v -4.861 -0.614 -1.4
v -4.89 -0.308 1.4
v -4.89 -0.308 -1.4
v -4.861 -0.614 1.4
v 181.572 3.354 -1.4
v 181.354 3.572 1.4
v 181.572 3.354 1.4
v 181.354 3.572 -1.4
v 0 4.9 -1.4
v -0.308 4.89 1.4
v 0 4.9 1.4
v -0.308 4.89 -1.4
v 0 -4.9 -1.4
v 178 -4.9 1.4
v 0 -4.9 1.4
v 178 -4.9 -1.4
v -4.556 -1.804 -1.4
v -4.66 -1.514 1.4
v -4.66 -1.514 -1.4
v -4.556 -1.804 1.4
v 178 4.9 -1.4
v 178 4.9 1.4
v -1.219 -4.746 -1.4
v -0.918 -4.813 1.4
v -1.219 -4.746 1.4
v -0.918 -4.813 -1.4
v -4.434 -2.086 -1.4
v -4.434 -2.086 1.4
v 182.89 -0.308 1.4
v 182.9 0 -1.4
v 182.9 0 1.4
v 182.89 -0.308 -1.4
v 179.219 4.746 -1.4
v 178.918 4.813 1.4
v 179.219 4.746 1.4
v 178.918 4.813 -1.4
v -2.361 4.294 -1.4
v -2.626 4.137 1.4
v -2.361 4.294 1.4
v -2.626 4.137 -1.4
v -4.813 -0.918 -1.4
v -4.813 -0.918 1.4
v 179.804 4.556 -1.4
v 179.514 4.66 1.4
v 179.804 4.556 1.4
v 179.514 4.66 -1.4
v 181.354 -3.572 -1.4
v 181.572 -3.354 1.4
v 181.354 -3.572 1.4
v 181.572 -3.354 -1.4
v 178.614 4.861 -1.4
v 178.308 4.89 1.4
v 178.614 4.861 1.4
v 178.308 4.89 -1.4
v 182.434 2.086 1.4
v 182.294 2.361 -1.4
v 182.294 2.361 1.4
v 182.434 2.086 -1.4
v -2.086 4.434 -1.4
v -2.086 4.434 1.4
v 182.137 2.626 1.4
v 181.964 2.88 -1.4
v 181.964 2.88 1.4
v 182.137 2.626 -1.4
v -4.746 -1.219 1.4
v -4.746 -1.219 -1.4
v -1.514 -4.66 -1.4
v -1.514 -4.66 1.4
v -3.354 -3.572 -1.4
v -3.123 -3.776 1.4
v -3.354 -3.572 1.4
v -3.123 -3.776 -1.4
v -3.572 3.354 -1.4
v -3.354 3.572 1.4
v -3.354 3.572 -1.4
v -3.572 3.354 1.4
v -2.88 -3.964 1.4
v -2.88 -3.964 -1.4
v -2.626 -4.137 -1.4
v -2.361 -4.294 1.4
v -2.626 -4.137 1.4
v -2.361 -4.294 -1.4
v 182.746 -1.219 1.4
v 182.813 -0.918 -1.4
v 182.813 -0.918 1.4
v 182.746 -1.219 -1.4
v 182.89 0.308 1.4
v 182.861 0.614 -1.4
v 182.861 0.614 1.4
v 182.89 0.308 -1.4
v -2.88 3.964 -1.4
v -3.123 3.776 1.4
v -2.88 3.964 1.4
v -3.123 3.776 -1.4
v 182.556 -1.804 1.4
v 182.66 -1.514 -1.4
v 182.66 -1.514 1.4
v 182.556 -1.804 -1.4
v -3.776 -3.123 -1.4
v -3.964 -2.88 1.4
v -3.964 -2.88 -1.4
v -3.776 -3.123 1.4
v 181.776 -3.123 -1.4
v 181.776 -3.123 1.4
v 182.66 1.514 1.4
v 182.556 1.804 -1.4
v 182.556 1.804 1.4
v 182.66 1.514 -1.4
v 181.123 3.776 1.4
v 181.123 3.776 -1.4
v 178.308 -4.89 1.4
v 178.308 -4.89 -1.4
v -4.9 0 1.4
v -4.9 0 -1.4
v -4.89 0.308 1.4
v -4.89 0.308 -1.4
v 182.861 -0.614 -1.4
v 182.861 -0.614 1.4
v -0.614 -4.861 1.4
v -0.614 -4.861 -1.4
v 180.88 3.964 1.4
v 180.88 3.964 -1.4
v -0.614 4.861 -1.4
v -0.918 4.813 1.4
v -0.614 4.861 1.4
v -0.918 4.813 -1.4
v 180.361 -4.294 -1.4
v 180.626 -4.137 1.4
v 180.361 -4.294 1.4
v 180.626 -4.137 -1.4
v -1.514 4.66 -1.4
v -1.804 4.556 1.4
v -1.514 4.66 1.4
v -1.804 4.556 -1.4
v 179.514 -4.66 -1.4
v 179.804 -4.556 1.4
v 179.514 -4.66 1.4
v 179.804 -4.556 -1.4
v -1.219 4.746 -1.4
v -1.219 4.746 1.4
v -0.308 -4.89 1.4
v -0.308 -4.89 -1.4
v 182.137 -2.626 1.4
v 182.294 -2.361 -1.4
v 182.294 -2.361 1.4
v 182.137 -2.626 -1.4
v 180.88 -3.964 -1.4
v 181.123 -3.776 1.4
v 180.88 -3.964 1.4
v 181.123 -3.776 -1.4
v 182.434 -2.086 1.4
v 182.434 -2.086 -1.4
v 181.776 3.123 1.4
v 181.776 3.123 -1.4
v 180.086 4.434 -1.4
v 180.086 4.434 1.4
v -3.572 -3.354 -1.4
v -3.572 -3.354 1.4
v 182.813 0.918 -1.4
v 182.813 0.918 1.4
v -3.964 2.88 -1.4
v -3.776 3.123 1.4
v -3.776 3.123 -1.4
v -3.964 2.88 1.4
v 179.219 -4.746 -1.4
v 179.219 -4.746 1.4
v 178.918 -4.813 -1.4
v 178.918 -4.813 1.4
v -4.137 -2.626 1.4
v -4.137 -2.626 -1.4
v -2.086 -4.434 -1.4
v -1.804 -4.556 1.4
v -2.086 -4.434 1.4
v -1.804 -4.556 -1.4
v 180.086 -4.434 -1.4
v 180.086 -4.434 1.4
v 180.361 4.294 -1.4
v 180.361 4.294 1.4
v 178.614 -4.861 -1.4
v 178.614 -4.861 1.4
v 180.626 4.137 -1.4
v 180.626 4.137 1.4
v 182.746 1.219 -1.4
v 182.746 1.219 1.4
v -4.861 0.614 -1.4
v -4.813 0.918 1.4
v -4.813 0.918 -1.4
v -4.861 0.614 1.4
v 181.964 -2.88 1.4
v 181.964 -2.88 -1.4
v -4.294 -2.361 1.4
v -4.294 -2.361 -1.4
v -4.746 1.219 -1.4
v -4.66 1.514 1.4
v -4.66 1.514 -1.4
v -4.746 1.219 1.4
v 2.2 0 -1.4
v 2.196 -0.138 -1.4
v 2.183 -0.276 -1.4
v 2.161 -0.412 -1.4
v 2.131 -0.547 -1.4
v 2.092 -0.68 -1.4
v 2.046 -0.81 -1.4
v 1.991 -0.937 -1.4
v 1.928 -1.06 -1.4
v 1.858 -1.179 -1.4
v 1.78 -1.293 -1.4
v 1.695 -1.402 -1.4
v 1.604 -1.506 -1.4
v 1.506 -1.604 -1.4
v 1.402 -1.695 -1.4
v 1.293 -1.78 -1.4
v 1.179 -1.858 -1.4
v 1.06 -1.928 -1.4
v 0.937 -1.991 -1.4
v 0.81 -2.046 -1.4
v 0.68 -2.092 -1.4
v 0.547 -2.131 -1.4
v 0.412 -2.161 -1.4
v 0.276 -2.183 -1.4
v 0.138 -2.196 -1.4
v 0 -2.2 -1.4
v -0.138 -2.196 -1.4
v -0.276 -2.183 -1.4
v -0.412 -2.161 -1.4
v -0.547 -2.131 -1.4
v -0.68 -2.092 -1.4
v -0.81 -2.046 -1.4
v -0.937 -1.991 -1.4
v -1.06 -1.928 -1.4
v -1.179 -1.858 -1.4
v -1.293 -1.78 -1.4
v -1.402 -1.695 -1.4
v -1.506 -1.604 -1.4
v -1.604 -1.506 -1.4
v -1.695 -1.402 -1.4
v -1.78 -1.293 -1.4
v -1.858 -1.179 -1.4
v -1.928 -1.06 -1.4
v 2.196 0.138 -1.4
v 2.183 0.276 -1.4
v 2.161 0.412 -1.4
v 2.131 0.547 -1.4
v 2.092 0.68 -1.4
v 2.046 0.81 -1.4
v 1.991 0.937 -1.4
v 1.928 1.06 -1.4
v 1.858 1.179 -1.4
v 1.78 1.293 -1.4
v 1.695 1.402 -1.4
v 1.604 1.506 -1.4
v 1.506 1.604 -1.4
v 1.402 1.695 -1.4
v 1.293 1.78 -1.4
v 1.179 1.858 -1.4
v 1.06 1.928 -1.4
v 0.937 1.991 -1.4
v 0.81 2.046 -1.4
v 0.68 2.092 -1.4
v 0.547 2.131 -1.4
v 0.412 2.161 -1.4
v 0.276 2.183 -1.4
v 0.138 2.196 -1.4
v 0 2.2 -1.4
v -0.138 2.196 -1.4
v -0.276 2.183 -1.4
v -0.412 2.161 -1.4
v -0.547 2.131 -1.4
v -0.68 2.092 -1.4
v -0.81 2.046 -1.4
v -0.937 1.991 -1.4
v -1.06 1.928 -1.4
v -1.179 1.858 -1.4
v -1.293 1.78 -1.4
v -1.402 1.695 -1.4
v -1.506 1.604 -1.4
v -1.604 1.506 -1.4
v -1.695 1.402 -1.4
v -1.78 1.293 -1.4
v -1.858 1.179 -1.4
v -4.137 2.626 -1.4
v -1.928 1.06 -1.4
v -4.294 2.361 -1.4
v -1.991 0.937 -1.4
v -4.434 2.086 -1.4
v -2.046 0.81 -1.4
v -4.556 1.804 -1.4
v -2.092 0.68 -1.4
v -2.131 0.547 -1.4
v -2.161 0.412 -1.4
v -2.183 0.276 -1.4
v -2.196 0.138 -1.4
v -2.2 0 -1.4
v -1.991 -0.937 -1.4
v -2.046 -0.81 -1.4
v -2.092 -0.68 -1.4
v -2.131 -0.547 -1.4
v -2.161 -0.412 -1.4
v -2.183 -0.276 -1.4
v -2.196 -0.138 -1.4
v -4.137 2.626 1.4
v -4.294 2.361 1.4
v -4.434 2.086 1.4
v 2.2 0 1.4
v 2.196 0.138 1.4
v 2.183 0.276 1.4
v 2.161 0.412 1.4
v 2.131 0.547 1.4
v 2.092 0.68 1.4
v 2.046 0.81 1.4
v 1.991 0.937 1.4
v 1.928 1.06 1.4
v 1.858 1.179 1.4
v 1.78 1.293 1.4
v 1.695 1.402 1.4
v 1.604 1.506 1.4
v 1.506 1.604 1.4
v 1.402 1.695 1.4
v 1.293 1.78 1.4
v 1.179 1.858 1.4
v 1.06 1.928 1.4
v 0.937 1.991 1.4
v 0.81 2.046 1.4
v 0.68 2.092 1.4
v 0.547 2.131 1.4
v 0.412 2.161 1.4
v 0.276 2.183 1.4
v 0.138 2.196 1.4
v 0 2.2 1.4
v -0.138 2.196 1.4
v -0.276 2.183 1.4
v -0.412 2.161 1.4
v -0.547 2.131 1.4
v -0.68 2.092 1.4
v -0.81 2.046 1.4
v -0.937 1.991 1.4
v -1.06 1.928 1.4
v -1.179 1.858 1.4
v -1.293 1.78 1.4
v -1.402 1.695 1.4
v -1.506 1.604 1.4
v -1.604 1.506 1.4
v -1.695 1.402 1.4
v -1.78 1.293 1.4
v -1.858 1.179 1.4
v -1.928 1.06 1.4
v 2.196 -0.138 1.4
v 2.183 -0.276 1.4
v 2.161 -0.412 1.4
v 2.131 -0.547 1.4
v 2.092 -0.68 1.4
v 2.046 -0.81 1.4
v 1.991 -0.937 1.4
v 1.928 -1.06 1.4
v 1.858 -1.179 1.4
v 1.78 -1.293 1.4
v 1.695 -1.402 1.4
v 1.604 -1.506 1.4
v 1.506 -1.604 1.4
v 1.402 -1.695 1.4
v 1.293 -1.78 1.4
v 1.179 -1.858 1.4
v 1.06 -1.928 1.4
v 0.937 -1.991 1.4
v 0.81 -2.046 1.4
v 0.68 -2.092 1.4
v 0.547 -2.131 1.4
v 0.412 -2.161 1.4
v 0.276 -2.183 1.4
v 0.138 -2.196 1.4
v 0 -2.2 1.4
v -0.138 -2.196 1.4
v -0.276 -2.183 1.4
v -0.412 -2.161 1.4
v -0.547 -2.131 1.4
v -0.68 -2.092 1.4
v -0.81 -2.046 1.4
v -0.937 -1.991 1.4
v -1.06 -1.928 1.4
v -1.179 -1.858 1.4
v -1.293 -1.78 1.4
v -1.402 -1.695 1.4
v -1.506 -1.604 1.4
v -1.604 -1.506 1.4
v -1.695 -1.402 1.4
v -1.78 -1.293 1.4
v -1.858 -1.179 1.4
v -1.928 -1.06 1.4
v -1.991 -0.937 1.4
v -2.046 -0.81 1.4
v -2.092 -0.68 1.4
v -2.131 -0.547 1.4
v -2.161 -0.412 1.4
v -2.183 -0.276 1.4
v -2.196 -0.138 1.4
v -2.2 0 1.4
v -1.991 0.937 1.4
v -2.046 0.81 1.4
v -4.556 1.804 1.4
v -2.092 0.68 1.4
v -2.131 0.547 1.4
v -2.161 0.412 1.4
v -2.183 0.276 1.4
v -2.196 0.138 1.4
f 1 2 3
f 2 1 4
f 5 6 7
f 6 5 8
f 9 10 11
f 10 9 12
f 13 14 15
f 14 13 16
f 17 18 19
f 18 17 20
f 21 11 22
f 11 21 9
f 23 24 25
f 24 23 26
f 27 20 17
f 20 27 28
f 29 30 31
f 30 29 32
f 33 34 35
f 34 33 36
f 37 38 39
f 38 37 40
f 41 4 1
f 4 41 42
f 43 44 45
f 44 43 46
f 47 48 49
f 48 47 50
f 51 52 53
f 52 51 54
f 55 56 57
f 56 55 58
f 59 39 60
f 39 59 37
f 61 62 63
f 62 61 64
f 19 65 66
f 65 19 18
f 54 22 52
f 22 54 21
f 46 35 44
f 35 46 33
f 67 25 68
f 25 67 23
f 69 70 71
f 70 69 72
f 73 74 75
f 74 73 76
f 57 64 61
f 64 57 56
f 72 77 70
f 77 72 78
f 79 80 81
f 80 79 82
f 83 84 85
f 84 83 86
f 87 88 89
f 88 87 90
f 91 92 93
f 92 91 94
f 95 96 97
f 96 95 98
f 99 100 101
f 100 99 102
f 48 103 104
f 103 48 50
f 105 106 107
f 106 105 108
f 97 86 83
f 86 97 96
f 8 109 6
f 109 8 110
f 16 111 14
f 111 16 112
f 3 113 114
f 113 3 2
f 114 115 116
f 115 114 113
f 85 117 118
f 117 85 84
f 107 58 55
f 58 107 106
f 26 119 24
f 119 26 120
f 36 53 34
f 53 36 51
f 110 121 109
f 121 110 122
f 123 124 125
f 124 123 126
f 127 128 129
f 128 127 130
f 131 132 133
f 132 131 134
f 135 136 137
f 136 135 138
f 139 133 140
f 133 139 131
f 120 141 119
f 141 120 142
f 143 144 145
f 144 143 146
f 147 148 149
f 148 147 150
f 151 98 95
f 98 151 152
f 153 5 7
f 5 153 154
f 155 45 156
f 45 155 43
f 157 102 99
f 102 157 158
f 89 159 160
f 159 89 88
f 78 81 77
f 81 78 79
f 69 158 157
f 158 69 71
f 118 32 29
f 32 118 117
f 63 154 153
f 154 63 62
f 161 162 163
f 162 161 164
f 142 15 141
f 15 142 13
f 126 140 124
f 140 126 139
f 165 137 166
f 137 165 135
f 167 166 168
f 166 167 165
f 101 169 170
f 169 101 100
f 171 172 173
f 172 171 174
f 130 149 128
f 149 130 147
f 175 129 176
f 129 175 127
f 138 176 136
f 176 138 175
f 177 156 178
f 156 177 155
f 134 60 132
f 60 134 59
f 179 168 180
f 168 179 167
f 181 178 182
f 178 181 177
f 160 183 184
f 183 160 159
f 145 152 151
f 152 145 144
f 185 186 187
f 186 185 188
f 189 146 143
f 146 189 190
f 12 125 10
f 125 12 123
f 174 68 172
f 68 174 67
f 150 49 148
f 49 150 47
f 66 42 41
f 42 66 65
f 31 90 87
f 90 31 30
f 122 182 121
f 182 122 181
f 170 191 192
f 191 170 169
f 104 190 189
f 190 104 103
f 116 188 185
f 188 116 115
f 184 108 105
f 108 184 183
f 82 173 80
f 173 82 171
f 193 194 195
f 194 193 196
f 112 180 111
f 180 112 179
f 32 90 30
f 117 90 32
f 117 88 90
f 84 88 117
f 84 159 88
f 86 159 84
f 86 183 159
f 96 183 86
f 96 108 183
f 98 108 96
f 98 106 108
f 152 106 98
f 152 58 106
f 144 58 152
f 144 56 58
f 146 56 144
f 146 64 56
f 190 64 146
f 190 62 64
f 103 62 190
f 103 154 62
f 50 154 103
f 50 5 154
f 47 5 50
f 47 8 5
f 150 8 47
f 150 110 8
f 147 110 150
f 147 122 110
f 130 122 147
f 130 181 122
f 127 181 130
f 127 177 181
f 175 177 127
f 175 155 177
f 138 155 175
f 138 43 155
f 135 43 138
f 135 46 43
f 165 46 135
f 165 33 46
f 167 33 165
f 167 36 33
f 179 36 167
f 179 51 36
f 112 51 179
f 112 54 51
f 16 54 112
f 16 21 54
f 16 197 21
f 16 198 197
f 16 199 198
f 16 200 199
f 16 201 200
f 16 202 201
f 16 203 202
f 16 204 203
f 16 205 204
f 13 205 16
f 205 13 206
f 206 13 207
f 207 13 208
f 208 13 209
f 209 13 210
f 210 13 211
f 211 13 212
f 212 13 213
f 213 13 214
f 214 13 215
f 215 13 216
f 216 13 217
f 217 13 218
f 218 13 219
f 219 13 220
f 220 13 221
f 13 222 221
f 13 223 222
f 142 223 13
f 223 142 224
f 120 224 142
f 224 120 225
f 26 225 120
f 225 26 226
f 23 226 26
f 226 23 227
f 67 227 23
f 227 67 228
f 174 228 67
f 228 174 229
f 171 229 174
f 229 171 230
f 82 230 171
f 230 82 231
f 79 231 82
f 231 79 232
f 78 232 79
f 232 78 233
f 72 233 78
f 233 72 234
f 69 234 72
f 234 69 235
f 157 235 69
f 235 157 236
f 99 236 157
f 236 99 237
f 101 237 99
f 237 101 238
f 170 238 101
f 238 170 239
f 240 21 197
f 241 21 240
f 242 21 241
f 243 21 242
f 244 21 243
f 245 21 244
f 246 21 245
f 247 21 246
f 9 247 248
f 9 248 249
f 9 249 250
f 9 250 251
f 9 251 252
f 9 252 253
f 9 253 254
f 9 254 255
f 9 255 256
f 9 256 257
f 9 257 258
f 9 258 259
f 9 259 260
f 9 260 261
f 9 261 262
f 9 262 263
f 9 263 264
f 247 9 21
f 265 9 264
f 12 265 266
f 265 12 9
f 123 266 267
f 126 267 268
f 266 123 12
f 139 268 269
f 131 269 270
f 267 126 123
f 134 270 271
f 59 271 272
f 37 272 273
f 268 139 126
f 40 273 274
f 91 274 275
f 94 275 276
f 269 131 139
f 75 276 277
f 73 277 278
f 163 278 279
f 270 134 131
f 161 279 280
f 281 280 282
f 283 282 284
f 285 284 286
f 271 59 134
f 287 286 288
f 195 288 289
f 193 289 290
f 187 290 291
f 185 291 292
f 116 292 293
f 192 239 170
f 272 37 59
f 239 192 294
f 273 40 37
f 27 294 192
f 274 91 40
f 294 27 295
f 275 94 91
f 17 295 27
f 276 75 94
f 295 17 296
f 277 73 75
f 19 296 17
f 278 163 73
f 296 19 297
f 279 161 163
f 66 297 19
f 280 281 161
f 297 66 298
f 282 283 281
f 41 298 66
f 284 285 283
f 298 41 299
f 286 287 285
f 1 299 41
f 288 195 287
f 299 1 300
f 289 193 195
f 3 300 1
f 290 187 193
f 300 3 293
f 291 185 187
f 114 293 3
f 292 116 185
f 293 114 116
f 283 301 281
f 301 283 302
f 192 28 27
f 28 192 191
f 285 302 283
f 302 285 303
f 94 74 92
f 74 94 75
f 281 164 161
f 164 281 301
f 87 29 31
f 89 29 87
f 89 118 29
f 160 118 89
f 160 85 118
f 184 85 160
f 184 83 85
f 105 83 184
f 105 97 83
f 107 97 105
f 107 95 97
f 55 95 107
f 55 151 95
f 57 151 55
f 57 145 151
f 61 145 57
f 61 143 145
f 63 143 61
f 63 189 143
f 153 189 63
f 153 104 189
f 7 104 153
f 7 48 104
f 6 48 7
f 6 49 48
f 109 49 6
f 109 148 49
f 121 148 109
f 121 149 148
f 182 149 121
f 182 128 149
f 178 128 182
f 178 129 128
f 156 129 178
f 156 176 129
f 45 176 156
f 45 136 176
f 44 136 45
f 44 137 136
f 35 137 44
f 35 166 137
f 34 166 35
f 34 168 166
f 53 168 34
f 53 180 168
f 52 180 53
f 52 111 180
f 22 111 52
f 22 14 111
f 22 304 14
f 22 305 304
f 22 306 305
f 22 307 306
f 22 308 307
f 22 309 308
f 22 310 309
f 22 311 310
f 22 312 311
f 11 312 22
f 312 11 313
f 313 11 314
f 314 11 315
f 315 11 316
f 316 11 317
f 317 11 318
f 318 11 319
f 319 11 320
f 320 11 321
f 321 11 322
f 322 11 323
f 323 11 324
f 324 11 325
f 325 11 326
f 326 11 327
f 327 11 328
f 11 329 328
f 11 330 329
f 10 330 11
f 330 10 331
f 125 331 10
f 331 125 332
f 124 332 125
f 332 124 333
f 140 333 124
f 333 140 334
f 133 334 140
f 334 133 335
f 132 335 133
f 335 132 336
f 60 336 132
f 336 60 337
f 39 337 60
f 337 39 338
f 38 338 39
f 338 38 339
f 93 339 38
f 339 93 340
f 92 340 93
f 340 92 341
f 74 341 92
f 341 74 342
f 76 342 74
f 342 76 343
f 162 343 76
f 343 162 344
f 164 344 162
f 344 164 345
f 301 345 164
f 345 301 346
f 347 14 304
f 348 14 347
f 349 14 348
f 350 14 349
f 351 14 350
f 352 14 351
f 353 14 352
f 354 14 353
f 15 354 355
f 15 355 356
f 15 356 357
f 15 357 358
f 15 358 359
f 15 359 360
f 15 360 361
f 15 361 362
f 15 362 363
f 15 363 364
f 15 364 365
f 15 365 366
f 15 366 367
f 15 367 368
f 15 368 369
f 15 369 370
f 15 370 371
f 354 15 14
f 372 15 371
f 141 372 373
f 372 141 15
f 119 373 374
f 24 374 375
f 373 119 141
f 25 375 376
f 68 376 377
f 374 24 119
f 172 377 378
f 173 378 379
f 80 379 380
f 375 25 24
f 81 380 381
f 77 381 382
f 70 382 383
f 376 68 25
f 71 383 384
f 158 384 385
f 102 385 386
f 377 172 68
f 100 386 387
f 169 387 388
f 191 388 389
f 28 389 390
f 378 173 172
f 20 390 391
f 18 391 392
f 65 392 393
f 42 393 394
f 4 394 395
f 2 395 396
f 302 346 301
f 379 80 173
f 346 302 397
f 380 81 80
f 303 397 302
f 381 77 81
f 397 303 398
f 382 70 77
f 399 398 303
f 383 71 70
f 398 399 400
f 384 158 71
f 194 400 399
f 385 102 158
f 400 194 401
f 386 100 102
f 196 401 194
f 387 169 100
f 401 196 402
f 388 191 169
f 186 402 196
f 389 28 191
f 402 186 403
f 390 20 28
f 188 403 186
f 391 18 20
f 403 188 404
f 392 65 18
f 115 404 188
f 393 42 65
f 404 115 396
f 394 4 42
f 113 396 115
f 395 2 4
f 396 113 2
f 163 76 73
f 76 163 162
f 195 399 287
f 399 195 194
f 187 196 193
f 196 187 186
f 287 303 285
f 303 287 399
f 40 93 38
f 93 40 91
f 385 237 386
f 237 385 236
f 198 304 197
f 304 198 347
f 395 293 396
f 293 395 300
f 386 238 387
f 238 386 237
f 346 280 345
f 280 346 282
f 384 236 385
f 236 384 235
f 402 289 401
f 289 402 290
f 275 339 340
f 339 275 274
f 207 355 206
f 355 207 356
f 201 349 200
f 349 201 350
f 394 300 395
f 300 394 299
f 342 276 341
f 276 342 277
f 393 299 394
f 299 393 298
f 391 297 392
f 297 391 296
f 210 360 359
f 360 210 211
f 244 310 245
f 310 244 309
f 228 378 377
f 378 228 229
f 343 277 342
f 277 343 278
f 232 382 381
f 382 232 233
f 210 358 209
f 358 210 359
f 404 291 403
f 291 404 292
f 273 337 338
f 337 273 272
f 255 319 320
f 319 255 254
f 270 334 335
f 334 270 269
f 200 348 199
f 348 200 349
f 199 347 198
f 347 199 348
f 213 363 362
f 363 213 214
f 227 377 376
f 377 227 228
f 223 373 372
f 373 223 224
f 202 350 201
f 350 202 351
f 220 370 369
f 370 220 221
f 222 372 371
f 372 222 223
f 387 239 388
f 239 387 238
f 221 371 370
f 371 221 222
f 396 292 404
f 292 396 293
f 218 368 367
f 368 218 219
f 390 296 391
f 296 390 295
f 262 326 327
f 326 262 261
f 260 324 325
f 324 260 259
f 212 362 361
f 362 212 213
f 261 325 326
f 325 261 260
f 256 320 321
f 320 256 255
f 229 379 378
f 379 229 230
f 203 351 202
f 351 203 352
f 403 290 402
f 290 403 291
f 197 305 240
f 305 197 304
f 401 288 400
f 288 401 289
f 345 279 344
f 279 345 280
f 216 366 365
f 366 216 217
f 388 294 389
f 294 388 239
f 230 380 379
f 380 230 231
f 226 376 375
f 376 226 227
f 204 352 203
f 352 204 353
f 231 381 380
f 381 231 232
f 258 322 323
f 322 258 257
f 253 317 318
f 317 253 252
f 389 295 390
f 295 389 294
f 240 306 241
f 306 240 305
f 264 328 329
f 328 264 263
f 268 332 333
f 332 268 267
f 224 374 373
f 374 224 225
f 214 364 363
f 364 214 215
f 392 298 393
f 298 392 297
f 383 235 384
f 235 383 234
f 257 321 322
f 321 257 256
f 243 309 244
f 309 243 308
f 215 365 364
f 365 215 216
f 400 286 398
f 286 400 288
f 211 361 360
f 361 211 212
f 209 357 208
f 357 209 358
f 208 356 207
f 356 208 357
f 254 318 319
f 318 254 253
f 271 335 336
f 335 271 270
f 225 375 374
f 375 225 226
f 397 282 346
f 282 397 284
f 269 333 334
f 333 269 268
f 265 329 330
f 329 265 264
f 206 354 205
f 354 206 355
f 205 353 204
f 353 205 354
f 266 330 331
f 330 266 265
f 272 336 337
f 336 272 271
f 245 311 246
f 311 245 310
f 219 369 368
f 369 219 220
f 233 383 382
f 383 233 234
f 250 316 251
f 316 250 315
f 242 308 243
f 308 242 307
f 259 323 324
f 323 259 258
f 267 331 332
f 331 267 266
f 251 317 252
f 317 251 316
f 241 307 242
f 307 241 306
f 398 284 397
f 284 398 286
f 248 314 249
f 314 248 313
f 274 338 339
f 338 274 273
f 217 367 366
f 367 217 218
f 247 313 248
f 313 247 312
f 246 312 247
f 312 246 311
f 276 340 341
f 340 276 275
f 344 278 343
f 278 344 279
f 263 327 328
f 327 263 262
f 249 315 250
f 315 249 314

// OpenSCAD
innerDiameter = 2.2;
outerDiameter = 4.9;
width = 2.8;
resolution = 100;
length = 178;

difference(){
    
    hull(){
        linear_extrude(height = width, center = true, convexity = 10, twist = 0, $fn = resolution){
            circle(outerDiameter, $fn = resolution);
        }
        

        linear_extrude(height = width, center = true, convexity = 10, twist = 0, $fn = resolution){
            translate([length,0,0])
                circle(outerDiameter, $fn = resolution);
        }
    }
    linear_extrude(height = width, center = true, convexity = 10, twist = 0, $fn = resolution){
        circle(innerDiameter, $fn = resolution);
    }

}
    
    
